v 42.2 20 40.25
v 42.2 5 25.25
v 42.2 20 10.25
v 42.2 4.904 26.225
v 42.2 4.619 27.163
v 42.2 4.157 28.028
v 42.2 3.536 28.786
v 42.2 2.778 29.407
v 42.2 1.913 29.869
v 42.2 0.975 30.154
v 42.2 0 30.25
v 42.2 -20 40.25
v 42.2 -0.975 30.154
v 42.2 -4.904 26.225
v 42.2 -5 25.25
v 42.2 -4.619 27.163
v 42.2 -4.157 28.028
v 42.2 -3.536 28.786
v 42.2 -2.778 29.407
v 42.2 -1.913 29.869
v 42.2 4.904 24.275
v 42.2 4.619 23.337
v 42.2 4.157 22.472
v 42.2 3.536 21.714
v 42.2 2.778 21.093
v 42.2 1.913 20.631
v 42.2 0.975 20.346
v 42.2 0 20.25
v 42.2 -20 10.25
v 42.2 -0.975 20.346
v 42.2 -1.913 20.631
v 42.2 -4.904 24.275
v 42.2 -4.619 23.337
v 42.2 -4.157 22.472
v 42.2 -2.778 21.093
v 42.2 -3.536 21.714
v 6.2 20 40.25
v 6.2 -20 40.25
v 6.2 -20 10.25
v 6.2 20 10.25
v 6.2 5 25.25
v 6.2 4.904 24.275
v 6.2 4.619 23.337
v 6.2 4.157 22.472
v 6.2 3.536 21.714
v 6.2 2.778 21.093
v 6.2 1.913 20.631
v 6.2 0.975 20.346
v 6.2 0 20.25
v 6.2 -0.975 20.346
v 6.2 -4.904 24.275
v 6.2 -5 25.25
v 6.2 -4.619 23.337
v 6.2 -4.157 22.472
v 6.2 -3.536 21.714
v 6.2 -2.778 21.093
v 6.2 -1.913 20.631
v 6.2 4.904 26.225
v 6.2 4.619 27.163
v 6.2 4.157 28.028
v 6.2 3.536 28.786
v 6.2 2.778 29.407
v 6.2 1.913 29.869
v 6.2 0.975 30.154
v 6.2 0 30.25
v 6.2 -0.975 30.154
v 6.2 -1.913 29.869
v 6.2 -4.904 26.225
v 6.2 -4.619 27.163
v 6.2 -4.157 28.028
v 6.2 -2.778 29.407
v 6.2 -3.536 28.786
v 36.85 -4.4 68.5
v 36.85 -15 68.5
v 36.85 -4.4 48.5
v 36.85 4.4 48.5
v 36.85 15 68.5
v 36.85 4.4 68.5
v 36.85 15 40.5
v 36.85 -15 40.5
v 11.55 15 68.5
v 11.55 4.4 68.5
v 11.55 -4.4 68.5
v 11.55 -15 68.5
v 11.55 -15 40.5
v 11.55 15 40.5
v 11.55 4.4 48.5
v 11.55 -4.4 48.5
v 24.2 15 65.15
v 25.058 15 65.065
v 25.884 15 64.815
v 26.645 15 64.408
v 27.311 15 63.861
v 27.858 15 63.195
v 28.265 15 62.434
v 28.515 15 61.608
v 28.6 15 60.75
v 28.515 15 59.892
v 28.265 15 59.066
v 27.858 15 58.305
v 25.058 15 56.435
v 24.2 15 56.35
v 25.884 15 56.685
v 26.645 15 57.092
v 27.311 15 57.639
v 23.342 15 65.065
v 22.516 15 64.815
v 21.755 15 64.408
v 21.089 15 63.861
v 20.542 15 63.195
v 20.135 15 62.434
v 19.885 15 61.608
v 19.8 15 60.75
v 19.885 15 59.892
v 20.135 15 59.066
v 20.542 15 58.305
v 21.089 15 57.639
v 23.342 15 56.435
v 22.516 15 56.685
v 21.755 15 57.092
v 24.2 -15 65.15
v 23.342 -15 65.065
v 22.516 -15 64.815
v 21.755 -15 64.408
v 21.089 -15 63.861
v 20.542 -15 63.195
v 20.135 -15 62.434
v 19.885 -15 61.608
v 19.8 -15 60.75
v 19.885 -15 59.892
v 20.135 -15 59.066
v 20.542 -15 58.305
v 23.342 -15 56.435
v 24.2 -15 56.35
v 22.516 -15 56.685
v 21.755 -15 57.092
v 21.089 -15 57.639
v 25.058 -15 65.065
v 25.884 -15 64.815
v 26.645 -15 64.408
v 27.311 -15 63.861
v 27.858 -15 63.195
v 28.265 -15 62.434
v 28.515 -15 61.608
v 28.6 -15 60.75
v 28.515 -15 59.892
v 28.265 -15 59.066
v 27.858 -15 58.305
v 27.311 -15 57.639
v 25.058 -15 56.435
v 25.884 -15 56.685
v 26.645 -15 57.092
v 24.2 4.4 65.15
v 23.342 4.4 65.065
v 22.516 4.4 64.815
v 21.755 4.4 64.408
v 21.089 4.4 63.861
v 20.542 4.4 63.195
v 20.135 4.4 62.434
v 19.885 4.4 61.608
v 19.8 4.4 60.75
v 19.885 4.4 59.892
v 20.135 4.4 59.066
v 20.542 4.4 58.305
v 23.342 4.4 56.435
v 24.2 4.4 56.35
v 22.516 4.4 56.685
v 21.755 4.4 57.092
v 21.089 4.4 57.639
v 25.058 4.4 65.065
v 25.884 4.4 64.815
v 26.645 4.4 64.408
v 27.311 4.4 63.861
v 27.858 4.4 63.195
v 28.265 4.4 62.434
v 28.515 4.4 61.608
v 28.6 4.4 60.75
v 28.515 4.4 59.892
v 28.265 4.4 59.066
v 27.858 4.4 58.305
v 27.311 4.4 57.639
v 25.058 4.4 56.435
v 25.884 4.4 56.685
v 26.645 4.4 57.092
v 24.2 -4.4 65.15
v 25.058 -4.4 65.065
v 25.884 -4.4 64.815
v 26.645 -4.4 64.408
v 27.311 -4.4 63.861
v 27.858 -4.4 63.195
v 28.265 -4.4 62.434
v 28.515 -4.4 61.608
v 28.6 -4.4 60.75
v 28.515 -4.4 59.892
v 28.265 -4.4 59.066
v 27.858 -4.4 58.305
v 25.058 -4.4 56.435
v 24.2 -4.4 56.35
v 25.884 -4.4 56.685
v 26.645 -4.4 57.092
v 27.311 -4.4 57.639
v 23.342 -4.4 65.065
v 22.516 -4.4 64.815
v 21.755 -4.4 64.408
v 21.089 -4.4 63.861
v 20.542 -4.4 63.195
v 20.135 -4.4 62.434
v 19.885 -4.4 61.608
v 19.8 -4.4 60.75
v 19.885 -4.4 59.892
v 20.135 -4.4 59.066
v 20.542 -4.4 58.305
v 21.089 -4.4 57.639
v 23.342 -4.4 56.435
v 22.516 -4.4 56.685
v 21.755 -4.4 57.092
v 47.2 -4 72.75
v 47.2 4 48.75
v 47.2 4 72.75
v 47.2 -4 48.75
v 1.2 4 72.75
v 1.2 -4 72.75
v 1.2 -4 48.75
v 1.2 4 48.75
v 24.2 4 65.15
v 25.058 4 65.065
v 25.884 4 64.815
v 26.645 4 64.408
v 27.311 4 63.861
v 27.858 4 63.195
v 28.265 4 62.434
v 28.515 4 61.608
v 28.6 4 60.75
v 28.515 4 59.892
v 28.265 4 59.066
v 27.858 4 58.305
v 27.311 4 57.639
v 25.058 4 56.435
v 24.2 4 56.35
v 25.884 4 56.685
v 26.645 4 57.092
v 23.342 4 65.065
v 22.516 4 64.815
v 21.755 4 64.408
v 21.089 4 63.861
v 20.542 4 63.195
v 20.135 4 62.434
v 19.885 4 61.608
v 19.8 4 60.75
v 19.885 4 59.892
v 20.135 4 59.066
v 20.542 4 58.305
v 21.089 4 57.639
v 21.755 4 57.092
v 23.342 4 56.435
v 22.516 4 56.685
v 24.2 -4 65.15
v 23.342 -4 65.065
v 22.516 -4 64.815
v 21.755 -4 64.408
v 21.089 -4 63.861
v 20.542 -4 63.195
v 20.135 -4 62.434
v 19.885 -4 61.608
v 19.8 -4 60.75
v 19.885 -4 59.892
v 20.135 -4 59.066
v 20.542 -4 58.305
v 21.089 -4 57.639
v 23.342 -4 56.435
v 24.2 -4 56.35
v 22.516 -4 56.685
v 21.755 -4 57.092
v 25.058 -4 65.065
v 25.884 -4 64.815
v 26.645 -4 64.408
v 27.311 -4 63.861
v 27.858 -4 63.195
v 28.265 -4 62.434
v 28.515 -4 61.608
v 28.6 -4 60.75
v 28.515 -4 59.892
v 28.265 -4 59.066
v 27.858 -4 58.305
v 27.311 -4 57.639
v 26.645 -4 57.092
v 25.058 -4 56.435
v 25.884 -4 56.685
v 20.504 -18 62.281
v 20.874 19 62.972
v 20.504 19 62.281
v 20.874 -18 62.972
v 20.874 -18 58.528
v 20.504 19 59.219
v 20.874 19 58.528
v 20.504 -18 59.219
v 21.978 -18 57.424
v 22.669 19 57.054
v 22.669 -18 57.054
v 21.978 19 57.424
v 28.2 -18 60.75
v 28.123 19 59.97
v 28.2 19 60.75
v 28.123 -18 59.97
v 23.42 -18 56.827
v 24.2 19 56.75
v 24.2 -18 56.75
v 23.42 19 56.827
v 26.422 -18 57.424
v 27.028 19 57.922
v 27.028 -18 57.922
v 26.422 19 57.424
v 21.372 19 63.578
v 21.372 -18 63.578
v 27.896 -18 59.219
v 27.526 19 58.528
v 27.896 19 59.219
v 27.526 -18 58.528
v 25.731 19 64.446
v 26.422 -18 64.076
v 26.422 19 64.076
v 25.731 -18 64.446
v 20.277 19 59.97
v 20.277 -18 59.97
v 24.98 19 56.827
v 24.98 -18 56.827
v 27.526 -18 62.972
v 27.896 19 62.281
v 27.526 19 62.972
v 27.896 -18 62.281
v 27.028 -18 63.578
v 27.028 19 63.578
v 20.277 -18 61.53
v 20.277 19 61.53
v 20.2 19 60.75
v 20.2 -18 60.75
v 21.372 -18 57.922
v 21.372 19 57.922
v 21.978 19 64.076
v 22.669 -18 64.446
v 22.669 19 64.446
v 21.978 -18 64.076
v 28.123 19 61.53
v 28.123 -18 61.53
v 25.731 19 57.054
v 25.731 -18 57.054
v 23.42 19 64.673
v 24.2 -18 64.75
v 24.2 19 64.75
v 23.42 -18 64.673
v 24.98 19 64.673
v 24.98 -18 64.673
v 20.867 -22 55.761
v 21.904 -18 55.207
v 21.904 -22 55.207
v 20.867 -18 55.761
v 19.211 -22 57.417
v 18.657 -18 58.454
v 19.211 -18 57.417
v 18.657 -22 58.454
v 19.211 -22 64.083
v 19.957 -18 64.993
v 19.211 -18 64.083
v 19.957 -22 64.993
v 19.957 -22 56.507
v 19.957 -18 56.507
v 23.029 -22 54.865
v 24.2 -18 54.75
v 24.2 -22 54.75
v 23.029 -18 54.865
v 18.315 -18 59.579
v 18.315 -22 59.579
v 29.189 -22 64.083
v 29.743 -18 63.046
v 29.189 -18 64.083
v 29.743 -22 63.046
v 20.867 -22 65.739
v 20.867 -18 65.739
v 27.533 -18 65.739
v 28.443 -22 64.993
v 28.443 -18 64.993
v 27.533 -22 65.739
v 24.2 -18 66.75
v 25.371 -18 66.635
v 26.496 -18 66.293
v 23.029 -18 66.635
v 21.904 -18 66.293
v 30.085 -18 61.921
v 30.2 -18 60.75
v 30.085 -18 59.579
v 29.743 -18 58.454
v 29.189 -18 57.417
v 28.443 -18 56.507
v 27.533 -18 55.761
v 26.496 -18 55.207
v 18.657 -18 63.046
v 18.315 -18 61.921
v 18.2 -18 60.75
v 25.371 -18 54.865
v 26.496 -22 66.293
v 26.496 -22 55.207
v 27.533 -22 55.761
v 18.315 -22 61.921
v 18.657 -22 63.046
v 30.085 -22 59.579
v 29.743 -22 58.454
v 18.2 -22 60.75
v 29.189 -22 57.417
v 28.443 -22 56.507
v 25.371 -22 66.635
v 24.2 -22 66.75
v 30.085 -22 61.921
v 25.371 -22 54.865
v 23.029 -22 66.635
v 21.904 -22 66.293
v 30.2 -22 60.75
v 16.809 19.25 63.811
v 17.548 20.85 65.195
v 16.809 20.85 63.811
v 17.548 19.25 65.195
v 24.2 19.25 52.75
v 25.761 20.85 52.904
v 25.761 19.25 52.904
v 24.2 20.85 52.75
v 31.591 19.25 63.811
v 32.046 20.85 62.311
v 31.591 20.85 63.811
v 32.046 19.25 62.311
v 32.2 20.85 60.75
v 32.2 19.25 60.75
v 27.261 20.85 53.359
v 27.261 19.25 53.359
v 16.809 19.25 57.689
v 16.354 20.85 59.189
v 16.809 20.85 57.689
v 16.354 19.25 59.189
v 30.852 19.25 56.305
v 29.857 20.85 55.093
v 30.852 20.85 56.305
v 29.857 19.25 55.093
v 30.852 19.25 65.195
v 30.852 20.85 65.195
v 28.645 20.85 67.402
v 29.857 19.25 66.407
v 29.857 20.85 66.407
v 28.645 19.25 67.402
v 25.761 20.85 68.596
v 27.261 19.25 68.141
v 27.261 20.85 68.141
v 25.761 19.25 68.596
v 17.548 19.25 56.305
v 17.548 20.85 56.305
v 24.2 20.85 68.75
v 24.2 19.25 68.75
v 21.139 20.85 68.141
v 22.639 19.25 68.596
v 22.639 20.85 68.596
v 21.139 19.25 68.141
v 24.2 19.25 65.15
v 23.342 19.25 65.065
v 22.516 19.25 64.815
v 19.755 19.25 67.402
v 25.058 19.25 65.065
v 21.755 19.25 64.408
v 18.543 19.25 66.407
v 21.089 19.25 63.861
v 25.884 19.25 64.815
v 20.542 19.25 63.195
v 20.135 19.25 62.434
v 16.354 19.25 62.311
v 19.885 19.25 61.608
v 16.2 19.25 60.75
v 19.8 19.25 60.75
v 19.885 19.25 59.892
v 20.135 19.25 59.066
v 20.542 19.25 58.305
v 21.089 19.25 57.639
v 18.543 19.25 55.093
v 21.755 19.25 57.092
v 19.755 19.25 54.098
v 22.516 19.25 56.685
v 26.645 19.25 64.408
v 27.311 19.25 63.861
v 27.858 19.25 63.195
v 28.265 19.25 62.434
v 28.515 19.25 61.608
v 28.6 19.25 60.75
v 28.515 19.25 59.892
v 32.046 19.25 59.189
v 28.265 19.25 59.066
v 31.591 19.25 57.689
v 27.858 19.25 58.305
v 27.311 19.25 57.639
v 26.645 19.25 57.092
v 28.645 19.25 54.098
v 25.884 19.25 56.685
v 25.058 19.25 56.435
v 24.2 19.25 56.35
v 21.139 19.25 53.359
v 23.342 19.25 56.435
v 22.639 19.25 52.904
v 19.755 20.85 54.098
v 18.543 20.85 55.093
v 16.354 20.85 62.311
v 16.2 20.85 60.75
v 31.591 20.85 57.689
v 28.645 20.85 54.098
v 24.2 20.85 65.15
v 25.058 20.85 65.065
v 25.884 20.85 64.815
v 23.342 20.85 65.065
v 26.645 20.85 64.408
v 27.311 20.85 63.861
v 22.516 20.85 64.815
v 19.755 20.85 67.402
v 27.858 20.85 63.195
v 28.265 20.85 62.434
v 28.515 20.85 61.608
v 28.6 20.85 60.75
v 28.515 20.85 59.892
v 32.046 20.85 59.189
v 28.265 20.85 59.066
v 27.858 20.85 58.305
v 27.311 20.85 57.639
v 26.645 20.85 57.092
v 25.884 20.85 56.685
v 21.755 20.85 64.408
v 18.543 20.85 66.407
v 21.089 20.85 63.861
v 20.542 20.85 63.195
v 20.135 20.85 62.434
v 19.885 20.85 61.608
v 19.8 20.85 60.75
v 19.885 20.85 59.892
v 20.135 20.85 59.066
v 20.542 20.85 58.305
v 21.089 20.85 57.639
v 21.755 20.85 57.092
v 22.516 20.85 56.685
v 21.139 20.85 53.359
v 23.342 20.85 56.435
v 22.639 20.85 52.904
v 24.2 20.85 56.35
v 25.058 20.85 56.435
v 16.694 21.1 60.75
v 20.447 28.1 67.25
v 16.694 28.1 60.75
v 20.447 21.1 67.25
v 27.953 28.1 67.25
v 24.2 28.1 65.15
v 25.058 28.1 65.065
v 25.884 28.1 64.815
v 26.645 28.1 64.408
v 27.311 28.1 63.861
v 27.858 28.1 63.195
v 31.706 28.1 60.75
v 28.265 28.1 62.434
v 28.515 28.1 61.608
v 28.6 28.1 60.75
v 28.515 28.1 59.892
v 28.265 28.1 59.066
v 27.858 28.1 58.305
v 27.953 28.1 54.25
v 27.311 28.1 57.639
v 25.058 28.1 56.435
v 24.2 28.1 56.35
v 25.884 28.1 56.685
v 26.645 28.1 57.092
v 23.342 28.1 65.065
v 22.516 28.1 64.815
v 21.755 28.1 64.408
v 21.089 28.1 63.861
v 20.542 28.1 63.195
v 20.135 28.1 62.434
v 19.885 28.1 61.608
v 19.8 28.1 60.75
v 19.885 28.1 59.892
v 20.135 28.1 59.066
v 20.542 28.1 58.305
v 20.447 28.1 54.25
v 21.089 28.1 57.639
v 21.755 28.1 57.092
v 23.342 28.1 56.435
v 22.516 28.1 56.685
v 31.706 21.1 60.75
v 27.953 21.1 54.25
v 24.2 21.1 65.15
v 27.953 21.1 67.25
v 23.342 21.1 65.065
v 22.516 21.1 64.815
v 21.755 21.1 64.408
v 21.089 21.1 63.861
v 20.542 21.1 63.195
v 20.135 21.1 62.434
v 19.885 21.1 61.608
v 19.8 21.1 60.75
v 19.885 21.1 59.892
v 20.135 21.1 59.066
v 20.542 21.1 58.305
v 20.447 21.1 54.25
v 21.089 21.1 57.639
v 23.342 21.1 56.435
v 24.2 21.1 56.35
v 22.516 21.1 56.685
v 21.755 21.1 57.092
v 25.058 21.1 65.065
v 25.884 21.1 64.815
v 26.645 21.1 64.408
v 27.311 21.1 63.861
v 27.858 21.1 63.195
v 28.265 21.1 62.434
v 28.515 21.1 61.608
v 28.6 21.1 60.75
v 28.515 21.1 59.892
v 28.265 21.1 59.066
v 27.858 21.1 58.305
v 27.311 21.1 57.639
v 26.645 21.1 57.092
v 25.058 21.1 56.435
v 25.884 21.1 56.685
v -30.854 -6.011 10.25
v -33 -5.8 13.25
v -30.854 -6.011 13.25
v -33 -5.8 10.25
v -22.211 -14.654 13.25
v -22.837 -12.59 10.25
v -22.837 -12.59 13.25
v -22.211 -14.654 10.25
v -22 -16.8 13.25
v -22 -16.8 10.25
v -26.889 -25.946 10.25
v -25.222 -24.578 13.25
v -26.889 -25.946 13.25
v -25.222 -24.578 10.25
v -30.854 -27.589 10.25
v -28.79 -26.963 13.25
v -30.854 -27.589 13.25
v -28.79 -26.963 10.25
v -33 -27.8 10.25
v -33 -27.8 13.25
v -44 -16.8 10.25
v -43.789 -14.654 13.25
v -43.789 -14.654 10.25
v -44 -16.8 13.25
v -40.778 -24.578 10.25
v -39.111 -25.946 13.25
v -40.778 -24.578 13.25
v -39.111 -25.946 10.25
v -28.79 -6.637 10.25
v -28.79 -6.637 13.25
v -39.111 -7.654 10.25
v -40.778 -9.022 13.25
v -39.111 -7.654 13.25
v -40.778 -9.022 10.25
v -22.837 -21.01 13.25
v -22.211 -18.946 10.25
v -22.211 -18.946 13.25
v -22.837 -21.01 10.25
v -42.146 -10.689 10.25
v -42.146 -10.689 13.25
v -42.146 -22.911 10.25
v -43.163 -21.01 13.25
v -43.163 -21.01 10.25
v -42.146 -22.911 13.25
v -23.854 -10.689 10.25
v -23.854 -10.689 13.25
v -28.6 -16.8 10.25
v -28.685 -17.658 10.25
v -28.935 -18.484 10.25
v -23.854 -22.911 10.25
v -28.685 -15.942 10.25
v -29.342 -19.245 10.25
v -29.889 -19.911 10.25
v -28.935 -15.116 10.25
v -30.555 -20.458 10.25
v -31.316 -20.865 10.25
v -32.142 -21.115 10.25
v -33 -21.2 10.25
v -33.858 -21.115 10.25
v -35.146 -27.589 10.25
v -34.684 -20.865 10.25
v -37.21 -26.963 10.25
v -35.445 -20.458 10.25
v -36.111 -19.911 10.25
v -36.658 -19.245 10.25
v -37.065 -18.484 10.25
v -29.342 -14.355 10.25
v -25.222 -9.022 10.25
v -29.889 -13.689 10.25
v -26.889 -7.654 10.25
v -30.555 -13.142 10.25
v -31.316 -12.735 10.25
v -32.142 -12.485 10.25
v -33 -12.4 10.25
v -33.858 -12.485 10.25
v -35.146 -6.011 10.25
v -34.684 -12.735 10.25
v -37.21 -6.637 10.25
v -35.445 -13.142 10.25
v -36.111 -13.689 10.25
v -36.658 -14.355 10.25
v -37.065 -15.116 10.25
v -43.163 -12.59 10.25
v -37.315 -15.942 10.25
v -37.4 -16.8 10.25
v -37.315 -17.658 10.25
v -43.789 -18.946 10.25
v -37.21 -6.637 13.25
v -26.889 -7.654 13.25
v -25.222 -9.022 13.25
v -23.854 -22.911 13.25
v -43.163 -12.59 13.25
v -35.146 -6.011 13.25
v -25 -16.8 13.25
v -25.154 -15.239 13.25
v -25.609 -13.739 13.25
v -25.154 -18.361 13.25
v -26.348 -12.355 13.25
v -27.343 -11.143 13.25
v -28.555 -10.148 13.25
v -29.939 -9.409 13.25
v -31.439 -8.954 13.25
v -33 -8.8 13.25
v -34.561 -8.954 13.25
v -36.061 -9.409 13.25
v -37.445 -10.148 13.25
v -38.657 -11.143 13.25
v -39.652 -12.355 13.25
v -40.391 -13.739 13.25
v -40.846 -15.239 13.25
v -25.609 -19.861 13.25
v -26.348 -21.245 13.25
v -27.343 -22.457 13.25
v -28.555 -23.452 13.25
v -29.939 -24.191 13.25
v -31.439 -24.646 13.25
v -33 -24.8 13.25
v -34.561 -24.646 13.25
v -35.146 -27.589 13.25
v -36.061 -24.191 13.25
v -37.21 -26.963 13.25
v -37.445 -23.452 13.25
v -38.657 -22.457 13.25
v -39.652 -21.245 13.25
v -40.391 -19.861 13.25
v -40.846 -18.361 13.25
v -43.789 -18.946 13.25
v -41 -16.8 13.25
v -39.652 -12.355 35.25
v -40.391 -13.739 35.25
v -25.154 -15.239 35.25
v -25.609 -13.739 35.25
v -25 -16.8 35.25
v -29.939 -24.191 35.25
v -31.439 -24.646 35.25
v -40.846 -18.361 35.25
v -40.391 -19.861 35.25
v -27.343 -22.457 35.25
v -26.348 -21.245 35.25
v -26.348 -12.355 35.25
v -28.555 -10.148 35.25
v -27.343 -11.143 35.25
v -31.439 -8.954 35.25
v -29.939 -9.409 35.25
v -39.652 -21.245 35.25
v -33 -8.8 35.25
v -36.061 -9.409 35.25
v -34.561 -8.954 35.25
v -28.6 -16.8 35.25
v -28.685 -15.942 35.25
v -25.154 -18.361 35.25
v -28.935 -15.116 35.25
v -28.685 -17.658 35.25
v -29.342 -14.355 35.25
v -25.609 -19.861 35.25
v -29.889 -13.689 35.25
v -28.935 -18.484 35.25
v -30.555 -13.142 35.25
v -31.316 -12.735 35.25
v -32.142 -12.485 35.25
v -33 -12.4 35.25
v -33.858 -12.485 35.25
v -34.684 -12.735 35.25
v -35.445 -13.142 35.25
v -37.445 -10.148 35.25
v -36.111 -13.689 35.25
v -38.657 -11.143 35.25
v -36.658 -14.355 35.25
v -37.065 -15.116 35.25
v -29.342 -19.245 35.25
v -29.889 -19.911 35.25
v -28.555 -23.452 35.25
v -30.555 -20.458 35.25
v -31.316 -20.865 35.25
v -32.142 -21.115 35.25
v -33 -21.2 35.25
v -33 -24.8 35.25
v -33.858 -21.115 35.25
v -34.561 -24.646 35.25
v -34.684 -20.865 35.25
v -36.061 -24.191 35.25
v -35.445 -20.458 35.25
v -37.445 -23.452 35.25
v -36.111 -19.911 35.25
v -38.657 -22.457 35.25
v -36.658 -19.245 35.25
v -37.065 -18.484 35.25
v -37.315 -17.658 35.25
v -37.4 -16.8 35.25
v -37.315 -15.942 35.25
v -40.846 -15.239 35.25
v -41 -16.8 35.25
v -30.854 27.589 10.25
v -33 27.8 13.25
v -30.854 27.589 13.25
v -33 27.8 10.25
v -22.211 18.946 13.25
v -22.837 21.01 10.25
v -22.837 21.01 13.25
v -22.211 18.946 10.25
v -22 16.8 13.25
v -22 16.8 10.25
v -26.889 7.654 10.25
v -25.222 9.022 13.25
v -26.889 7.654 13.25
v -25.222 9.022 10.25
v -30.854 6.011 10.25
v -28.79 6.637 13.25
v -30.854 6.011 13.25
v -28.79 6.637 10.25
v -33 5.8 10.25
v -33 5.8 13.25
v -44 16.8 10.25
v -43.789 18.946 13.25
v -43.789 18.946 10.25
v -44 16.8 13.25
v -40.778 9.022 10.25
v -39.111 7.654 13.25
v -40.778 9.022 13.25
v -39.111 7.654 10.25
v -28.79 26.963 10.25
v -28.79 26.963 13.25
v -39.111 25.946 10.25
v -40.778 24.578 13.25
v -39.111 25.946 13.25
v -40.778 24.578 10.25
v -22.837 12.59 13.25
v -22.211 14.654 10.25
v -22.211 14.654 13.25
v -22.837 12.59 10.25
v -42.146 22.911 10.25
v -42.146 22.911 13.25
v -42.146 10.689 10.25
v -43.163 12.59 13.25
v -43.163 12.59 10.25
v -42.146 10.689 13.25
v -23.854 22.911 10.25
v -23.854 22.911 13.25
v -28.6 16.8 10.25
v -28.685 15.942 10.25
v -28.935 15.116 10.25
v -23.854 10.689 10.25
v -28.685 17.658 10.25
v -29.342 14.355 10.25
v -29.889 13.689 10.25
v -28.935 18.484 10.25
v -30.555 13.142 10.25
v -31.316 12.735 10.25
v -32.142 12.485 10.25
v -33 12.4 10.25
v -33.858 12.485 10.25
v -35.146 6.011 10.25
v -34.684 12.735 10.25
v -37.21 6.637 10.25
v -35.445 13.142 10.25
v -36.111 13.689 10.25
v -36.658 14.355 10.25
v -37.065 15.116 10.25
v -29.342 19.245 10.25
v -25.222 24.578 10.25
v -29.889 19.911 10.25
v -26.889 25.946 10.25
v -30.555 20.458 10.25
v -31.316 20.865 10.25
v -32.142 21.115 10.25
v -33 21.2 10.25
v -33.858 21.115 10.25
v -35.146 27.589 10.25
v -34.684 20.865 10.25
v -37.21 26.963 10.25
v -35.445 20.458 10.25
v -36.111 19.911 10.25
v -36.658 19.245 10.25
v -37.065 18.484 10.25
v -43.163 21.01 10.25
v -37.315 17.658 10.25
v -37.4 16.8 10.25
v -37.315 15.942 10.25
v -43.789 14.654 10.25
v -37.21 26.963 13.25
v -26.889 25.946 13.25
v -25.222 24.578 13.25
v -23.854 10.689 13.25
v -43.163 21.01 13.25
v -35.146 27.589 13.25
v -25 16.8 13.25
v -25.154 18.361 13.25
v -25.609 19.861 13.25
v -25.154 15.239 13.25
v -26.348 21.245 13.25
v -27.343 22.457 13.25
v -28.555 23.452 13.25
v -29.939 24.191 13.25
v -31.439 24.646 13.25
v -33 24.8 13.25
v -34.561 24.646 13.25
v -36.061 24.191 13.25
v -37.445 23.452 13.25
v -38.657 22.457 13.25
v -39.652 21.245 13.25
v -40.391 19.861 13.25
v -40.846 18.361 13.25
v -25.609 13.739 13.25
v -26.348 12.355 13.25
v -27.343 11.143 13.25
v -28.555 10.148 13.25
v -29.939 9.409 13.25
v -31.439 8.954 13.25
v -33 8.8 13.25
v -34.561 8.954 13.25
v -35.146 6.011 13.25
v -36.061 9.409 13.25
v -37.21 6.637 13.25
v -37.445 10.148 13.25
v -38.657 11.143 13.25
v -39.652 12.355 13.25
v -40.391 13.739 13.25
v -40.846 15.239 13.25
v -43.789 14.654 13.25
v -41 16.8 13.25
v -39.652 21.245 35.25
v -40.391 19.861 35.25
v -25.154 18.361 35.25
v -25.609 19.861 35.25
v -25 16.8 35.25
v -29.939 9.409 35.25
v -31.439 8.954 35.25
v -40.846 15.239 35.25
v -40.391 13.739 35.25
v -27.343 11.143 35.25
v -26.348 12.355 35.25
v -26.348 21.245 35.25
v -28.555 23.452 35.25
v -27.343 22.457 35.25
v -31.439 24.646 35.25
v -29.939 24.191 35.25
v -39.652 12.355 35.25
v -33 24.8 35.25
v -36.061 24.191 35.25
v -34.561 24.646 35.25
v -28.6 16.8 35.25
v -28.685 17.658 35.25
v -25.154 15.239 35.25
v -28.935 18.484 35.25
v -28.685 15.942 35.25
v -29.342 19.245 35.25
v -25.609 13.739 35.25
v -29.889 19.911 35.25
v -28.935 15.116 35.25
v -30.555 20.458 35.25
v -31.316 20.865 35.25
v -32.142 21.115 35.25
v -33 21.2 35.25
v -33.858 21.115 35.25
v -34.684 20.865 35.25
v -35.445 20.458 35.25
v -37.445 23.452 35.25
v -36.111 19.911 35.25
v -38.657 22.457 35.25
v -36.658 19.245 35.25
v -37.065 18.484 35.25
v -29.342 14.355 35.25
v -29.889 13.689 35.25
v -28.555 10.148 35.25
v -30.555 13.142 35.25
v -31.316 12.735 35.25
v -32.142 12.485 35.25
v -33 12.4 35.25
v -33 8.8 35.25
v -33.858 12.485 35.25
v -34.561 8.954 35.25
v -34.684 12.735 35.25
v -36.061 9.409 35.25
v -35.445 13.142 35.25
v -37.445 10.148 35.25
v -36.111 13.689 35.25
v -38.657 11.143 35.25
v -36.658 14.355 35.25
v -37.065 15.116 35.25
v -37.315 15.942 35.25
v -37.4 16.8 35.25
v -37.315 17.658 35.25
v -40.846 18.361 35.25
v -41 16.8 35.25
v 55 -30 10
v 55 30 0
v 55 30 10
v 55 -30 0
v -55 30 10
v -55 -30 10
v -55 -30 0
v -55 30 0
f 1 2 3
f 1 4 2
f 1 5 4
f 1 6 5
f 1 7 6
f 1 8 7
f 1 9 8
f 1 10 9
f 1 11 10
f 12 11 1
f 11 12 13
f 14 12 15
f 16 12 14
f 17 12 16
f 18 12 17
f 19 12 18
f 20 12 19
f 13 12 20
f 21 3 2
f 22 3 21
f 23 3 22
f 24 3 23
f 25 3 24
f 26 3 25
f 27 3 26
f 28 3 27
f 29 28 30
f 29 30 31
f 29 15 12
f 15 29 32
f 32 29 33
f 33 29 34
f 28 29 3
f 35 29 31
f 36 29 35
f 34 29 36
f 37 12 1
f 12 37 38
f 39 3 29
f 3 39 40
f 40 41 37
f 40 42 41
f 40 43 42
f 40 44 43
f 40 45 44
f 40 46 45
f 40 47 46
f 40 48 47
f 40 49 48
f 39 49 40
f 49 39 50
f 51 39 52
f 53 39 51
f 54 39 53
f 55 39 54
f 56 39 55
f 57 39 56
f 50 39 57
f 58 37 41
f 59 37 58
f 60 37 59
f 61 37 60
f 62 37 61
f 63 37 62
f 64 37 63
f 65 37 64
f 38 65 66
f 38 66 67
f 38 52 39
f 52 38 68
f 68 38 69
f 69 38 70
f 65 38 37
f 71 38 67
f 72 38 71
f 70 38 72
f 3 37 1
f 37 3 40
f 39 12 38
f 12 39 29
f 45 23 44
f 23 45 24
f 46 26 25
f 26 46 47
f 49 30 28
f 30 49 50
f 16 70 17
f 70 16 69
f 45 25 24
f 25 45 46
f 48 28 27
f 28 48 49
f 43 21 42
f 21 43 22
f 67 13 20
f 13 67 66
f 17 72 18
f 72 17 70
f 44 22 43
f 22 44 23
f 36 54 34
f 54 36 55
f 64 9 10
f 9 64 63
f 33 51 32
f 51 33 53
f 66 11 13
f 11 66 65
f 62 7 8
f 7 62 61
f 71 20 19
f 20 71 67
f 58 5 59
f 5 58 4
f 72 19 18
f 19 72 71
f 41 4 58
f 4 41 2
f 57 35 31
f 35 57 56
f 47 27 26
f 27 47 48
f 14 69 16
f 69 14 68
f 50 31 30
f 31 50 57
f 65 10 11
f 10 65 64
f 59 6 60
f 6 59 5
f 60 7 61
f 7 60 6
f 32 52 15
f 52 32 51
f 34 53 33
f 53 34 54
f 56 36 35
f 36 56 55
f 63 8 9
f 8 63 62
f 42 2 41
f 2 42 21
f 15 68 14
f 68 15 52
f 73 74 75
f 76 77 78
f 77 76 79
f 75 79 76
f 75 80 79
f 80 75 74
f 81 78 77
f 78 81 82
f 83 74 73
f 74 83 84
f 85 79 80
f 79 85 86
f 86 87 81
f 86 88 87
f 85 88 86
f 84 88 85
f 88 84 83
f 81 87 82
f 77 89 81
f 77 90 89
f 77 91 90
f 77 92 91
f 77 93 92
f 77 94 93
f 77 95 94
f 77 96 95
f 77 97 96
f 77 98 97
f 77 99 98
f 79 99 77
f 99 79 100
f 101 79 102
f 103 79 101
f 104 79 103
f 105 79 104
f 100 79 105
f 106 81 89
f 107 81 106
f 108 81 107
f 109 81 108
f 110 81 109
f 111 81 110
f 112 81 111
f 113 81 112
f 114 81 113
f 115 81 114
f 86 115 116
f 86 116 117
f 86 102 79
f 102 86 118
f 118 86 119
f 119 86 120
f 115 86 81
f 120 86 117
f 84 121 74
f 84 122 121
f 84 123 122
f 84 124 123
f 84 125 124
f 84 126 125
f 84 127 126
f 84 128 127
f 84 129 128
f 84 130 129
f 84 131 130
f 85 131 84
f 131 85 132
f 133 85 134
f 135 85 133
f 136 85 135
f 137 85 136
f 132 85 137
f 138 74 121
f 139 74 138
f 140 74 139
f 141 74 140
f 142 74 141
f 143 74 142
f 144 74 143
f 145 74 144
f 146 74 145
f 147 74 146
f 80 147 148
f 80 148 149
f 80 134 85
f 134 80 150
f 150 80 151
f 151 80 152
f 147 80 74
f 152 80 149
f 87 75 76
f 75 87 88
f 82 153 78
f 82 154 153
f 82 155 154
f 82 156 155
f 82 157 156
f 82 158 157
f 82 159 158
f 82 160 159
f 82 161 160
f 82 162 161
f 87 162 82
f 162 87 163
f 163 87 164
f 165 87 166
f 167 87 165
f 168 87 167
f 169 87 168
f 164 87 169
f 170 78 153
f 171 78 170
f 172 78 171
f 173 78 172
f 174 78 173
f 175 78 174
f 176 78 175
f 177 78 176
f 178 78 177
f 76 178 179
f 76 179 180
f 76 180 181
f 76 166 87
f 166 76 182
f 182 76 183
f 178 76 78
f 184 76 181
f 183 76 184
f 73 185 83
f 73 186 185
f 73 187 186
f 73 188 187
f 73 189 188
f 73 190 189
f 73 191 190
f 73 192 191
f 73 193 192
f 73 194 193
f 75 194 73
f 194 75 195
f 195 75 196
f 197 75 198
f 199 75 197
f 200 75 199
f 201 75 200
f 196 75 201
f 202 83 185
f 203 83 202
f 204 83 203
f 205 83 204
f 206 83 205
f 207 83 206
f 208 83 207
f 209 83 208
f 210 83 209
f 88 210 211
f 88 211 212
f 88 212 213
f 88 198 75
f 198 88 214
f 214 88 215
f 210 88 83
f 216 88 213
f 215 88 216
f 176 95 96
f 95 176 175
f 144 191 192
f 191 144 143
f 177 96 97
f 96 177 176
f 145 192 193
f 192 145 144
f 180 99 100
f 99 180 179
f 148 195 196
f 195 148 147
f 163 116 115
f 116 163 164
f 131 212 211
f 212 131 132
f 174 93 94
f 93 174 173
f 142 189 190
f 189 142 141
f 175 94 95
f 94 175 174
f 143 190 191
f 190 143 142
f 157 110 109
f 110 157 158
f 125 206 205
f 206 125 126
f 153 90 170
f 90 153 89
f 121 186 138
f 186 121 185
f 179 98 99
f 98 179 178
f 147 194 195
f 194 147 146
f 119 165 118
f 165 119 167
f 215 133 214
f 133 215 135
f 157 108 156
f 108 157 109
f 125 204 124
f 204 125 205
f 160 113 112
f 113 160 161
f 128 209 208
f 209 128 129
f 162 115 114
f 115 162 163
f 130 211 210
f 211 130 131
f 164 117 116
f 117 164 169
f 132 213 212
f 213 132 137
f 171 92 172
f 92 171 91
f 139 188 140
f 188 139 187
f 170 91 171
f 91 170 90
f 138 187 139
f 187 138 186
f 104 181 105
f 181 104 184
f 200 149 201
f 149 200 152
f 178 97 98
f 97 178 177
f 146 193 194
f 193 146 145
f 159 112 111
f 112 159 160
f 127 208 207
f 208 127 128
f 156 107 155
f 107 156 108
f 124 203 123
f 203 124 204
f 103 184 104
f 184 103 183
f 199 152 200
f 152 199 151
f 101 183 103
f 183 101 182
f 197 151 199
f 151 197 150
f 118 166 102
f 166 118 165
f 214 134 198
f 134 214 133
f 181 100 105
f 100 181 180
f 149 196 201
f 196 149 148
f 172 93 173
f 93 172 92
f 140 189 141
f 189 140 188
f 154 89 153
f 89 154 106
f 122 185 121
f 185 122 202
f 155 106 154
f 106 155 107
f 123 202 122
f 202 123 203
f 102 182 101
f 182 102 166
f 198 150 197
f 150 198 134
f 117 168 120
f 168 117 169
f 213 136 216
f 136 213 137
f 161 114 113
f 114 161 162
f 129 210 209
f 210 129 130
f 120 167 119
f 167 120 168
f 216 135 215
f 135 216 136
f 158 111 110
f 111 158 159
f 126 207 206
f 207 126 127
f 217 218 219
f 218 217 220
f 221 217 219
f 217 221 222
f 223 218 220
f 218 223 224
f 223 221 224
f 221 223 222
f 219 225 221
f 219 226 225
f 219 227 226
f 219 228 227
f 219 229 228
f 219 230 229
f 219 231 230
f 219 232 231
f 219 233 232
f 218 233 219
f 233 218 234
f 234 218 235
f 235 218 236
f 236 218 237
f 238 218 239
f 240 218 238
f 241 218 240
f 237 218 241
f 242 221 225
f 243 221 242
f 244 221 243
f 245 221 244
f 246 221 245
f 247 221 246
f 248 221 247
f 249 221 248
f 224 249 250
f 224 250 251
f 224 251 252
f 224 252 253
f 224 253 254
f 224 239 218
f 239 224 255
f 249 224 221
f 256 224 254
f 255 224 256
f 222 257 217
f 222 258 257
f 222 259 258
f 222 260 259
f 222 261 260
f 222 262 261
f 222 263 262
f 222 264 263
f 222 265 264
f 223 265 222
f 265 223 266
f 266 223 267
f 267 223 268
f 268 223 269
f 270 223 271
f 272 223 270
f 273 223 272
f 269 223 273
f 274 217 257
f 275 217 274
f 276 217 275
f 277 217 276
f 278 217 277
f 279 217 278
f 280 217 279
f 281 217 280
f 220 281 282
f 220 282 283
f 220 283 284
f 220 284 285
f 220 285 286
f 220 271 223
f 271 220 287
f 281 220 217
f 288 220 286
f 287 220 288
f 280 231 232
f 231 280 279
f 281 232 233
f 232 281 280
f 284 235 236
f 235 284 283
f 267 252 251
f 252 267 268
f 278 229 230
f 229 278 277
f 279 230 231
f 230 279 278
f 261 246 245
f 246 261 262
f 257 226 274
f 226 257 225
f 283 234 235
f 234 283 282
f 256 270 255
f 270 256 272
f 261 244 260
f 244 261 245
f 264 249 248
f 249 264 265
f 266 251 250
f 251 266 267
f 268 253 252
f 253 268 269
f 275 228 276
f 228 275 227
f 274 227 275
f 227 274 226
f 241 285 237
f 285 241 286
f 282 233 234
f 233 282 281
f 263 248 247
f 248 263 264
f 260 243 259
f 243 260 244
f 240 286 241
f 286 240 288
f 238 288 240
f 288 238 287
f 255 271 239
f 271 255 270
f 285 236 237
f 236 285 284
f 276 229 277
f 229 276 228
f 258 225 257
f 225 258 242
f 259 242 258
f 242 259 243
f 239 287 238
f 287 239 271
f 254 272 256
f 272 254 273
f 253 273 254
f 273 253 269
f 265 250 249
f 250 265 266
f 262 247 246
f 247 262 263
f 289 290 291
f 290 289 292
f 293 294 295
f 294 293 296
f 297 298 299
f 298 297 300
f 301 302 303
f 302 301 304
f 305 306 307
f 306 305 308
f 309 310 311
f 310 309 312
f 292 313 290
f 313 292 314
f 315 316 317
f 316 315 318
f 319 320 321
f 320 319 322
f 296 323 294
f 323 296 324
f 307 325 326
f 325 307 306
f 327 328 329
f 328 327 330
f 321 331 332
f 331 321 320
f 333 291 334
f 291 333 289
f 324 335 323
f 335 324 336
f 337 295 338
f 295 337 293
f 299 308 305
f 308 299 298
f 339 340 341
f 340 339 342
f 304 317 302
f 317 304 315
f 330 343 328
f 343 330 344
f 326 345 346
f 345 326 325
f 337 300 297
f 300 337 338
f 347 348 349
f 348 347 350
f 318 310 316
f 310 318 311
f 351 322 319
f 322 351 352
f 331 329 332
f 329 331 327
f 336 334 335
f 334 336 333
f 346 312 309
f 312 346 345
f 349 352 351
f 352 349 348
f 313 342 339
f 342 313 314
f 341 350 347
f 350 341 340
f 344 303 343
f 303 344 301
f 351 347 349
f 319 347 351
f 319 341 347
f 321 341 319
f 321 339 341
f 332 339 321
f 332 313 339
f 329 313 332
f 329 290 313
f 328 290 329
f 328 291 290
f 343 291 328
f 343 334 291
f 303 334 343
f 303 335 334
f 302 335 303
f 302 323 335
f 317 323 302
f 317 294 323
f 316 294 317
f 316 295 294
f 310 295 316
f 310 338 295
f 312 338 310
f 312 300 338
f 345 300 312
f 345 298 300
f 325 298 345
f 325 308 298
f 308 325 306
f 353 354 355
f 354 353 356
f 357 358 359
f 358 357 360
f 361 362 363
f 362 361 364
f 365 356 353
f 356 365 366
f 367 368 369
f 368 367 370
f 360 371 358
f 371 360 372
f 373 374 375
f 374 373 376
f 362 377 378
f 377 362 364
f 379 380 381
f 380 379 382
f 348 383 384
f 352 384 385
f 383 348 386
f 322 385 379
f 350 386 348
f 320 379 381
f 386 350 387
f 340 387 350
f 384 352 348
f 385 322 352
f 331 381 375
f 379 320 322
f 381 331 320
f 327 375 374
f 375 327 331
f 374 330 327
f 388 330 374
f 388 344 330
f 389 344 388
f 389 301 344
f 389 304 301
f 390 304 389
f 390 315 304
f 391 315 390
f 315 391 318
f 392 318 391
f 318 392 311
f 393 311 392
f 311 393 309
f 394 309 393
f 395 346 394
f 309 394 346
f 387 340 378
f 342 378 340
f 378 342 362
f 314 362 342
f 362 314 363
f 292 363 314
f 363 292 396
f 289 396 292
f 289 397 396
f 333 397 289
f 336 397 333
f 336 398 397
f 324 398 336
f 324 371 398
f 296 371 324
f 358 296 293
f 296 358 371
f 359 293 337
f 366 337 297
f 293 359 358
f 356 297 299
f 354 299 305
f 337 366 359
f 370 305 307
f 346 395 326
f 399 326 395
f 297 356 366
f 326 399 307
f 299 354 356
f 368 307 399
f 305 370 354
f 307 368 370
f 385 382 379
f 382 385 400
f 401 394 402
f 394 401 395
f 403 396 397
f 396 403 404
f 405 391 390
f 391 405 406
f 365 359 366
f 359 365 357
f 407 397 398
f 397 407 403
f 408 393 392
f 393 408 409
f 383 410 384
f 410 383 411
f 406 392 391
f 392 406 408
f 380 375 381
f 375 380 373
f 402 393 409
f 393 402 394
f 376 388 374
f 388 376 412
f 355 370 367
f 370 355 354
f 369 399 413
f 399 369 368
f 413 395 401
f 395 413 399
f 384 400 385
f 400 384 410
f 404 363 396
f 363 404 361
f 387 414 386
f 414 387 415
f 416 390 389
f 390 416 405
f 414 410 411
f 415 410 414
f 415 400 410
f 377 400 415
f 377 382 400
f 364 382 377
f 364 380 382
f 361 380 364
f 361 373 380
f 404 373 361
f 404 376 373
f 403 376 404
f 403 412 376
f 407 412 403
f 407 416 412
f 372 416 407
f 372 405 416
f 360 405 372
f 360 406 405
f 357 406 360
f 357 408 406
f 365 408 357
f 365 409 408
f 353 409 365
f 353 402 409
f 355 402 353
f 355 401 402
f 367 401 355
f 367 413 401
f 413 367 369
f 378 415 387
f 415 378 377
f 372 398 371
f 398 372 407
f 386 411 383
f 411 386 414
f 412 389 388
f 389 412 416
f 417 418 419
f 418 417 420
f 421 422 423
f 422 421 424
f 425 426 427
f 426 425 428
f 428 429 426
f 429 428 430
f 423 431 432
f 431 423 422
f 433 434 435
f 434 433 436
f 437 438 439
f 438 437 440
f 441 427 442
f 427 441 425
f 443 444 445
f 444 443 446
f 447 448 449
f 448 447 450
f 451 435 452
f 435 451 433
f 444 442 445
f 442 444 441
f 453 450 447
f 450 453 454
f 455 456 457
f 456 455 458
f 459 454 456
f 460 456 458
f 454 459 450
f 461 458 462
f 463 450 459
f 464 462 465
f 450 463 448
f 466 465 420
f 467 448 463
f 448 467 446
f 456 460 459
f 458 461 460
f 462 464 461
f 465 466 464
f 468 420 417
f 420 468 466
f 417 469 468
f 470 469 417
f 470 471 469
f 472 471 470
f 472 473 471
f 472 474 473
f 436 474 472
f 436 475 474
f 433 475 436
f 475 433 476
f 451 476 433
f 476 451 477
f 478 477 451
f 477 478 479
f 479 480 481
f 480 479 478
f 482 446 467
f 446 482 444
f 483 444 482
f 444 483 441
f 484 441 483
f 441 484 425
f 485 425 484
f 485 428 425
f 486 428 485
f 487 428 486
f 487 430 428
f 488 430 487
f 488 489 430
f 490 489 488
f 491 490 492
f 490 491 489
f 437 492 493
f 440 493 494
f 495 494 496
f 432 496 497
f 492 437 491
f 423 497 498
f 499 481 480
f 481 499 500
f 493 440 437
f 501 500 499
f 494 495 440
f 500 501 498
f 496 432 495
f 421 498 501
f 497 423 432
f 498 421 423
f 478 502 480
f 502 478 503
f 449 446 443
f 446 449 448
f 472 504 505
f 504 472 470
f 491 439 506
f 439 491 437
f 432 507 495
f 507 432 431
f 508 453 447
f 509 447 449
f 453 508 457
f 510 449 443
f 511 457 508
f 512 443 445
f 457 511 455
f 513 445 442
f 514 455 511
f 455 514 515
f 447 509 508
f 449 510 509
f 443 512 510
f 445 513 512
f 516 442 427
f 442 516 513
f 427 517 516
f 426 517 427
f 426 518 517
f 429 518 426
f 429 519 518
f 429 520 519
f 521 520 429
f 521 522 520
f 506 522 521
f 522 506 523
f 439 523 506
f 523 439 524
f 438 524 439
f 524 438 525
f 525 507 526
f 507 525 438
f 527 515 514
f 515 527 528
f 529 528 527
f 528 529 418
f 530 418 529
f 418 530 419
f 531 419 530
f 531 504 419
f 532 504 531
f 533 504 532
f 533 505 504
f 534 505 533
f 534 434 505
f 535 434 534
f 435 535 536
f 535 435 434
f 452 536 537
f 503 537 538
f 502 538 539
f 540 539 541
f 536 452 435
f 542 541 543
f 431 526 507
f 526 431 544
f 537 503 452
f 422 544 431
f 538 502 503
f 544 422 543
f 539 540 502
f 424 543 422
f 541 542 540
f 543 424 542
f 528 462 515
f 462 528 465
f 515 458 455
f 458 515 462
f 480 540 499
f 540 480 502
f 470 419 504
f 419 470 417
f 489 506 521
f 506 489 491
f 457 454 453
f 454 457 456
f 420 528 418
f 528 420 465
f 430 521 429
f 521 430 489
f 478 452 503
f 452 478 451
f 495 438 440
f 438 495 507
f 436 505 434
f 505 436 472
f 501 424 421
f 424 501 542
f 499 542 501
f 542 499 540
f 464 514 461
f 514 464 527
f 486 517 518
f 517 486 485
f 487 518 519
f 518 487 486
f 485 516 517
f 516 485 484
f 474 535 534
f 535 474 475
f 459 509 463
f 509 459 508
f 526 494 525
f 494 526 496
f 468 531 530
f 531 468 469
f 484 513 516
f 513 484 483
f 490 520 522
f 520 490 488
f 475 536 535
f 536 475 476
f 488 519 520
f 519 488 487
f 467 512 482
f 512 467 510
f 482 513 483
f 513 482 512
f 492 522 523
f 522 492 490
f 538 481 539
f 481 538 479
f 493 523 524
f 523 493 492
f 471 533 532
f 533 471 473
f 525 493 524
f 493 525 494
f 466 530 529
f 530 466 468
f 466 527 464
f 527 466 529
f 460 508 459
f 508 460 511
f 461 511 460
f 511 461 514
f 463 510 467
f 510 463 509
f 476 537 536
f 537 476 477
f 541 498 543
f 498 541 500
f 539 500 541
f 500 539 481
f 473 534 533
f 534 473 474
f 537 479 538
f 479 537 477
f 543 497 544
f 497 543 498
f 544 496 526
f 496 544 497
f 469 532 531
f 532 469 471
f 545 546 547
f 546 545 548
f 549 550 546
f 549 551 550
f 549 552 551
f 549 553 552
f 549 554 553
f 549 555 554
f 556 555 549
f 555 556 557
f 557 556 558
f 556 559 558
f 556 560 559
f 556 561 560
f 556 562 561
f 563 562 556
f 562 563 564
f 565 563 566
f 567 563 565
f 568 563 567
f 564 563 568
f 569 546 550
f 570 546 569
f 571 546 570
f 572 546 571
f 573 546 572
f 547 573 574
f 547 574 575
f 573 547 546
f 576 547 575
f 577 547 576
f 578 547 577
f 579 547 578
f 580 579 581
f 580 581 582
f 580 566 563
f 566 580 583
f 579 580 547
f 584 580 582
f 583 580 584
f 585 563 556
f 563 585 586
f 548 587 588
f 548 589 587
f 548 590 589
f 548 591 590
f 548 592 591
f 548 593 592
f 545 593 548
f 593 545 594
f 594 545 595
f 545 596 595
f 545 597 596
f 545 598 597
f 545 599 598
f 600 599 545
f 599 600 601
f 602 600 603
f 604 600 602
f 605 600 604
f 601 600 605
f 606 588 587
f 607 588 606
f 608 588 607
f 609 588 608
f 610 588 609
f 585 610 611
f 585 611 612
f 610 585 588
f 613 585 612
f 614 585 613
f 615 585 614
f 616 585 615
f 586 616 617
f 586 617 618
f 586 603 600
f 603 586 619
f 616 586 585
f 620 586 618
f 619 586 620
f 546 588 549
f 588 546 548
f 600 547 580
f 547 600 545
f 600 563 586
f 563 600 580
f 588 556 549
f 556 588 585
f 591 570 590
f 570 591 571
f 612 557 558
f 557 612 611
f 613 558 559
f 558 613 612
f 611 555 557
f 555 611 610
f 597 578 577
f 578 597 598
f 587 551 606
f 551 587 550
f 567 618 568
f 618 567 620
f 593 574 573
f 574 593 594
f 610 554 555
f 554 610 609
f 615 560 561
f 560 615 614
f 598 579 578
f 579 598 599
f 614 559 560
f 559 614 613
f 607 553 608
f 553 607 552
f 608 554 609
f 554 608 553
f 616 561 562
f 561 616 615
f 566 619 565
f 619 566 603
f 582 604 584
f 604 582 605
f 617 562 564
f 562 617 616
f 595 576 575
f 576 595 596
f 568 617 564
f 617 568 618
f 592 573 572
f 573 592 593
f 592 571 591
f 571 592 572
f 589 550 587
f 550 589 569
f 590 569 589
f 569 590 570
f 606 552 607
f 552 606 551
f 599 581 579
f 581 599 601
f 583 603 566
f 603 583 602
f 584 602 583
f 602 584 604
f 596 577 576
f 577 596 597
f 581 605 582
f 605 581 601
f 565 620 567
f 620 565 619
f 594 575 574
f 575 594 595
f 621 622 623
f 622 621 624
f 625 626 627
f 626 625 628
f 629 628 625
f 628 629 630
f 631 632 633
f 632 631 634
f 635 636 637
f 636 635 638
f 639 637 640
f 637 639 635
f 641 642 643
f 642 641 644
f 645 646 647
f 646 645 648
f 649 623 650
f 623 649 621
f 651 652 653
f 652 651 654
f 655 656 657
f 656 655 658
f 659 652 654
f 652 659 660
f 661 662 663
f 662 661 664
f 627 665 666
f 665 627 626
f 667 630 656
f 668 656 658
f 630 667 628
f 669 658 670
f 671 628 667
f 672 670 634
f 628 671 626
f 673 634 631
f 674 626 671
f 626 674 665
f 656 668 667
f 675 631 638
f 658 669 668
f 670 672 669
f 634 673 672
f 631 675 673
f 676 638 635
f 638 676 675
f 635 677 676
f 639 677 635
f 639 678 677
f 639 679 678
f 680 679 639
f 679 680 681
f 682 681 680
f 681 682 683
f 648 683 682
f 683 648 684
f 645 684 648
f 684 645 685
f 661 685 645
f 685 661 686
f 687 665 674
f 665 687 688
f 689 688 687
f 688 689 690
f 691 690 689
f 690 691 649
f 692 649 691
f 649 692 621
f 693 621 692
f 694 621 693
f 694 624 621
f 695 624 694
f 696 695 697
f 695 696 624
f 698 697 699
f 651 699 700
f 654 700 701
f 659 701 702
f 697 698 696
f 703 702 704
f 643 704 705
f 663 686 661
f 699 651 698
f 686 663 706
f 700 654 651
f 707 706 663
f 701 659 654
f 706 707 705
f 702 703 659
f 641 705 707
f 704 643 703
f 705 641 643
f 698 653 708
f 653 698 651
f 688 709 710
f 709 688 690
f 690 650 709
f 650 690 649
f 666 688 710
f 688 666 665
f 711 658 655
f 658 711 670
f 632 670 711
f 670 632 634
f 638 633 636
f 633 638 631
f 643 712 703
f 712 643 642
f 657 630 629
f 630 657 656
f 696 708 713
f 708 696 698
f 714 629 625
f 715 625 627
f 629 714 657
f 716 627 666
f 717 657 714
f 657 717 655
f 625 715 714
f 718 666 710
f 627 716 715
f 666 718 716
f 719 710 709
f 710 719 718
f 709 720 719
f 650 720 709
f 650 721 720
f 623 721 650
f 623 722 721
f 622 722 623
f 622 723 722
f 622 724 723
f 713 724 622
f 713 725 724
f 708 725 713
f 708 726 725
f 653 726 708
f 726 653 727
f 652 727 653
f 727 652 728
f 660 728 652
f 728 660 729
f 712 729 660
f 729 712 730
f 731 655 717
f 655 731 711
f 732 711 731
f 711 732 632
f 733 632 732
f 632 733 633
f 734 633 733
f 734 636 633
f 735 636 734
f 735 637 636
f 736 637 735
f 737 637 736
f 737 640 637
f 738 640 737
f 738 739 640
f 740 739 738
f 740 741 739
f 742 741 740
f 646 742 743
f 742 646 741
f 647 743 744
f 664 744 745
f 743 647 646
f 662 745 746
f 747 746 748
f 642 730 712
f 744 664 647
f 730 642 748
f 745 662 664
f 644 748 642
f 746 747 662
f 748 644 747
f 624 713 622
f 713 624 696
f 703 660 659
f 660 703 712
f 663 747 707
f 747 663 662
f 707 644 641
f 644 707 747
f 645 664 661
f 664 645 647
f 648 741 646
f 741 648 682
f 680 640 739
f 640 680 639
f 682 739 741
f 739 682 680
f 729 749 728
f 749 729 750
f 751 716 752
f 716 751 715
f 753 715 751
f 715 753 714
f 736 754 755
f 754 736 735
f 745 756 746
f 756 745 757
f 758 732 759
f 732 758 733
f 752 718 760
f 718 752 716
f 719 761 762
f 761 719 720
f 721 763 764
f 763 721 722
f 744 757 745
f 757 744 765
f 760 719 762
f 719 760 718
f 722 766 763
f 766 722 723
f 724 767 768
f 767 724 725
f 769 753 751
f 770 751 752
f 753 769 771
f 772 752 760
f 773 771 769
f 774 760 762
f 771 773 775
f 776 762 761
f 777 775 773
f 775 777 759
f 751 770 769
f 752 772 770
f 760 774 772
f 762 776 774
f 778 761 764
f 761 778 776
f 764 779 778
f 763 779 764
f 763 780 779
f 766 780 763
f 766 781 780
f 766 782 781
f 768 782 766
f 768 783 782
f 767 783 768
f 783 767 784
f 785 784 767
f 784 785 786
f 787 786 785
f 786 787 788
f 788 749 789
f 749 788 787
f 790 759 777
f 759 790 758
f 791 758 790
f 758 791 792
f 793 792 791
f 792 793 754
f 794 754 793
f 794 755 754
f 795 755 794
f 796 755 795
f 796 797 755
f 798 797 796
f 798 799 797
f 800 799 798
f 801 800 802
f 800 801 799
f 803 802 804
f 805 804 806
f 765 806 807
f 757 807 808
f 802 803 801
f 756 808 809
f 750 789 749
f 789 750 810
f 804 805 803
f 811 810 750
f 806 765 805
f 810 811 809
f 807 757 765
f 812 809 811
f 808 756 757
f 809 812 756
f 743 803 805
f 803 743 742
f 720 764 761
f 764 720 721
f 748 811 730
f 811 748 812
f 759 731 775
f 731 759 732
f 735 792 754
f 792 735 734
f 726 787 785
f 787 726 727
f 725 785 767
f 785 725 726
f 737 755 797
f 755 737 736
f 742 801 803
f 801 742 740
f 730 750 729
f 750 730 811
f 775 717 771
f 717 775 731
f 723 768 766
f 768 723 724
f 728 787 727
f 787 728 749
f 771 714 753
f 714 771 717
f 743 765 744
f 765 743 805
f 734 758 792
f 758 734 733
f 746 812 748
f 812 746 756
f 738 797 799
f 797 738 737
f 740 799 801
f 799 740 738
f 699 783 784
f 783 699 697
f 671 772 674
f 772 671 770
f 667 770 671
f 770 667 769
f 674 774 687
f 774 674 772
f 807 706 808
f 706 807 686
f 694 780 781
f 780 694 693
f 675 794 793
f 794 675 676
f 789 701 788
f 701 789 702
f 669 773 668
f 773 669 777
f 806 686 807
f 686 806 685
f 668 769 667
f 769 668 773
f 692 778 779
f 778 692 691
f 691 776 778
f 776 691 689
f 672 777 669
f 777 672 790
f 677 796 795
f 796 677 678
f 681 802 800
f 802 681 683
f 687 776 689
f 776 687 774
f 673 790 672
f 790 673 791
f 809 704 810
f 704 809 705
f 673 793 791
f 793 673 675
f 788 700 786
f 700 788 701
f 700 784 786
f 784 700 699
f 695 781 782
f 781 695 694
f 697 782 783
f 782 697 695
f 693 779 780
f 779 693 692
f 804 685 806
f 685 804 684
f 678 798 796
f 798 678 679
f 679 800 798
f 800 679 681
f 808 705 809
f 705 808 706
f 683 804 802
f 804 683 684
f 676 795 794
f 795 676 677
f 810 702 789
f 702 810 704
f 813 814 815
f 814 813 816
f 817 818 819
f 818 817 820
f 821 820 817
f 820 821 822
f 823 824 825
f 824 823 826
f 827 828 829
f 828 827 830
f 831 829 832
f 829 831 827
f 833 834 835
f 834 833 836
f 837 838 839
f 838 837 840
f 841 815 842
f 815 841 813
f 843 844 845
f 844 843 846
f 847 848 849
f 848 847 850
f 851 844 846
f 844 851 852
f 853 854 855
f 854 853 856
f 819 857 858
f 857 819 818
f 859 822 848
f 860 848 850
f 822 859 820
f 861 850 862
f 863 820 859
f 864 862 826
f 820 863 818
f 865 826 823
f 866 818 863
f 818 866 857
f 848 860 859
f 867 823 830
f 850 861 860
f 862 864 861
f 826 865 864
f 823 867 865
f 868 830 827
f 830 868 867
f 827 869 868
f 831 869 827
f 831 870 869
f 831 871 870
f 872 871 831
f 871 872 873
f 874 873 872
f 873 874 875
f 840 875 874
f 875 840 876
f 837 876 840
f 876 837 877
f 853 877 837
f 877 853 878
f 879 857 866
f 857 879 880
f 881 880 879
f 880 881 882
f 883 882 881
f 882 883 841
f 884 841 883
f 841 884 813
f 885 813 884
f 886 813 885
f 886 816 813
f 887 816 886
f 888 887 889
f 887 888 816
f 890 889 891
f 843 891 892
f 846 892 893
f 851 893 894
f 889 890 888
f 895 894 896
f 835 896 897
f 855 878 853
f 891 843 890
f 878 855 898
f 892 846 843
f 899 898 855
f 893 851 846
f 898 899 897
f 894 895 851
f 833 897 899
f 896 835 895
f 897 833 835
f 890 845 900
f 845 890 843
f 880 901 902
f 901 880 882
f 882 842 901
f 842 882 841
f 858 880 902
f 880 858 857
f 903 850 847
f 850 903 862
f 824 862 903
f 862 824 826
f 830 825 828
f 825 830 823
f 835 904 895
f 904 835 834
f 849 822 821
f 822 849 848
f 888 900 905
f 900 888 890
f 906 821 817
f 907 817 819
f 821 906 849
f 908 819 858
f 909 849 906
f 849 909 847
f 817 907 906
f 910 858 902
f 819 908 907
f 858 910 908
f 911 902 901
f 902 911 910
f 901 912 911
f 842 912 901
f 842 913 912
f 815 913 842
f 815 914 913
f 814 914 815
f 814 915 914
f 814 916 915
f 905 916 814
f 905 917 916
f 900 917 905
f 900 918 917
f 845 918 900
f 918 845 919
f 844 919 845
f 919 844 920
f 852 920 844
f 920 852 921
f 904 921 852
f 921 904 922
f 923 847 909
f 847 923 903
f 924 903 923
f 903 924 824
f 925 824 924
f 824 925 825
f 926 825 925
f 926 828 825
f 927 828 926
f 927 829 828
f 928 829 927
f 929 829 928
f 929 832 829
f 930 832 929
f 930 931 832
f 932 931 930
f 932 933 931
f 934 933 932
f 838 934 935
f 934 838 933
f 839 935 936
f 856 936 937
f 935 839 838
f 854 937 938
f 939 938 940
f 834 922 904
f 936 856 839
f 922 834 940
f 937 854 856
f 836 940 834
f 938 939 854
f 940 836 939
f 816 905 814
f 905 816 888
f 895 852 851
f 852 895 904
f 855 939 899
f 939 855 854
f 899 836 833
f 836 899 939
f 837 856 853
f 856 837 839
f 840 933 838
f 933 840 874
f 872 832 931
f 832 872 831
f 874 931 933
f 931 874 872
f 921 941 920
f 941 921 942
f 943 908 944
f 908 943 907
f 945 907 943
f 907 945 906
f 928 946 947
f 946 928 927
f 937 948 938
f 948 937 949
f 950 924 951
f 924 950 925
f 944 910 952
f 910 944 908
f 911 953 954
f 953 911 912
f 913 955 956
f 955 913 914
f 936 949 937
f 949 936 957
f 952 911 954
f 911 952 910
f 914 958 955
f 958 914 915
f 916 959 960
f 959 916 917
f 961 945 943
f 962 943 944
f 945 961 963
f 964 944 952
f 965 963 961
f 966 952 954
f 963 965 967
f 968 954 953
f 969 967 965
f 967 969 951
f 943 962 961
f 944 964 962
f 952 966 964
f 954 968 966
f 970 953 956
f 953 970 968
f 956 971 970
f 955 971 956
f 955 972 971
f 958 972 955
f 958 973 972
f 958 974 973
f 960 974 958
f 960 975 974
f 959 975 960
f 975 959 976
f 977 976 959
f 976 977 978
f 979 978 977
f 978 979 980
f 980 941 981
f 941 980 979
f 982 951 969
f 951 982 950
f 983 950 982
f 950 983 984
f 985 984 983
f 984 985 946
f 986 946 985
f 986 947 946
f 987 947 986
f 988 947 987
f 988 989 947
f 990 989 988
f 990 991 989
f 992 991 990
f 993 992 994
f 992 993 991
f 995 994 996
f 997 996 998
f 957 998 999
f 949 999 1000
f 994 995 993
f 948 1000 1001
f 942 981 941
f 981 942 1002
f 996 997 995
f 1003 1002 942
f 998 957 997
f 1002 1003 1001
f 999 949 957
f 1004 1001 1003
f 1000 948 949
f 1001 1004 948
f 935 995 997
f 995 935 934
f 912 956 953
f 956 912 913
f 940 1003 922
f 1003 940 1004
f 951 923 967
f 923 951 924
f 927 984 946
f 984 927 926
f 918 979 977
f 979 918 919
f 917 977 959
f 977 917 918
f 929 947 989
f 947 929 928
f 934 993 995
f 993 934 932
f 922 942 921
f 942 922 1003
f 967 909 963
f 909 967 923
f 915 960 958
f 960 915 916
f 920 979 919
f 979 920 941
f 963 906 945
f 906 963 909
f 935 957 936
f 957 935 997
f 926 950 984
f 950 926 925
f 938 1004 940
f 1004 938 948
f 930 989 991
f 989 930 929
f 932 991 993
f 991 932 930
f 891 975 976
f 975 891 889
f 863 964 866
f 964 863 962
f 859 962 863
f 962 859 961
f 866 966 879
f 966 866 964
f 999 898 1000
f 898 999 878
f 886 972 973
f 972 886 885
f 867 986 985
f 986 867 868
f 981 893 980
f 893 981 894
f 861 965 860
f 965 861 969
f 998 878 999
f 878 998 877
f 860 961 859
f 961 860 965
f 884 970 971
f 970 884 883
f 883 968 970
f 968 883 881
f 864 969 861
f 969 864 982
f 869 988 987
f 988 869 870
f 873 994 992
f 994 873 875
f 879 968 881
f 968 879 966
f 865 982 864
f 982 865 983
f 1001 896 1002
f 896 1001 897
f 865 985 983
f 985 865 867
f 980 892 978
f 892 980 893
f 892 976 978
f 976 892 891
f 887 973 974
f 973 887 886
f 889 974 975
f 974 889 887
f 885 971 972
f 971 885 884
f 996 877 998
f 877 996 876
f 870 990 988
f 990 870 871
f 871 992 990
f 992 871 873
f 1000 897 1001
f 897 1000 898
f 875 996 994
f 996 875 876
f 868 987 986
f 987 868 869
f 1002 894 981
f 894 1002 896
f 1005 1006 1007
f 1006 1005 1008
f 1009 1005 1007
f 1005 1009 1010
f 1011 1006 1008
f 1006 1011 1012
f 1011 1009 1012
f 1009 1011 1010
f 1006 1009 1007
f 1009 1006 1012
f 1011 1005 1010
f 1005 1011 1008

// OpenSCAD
$fn = 32;

// ------------------------------------------------------------------------
// Indexing jig: plate 110 x 60 mm, pin d8
// Every part is its own module, assembly() places every instance.
// ------------------------------------------------------------------------

// --- part 1 ---
module jig_plate() {
  difference() {
    translate([-55, -30, 0]) cube([110, 60, 10]);
  }
}

// --- part 2 ---
module locator_block() {
  difference() {
    translate([-18, -20, 0]) cube([36, 40, 30]);
    translate([0, 0, 15]) rotate([0, 90, 0]) cylinder(h = 38, d = 10, center = true);
  }
}

// --- part 3 ---
module index_fork() {
  difference() {
    translate([-12.65, -15, 0]) cube([25.3, 30, 28]);
    translate([-13.65, -4.4, 8]) cube([27.3, 8.8, 21]);
    translate([0, 0, 20.25]) rotate([90, 0, 0]) cylinder(h = 32, d = 8.8, center = true);
  }
}

// --- part 4 ---
module index_arm() {
  difference() {
    translate([-23, -4, 0]) cube([46, 8, 24]);
    translate([0, 0, 12]) rotate([90, 0, 0]) cylinder(h = 10, d = 8.8, center = true);
  }
}

// --- part 5 ---
module index_pin() {
  rotate([0, 90, 0]) cylinder(h = 38, d = 8, center = true);
  translate([-22, 0, 0]) rotate([0, 90, 0]) cylinder(h = 4, d = 12);
}

// --- part 6 ---
module pin_washer() {
  difference() {
      translate([0, 0, 0]) cylinder(h = 1.6, d = 16);
      translate([0, 0, -1]) cylinder(h = 3.6, d = 8.8);
    }
}

// --- part 7 ---
module lock_nut() {
  difference() {
    linear_extrude(height = 7) polygon(points = [[7.506, 0], [3.753, 6.5], [-3.753, 6.5], [-7.506, 0], [-3.753, -6.5], [3.753, -6.5]]);
    translate([0, 0, -1]) cylinder(h = 9, d = 8.8);
  }
}

// --- part 8 ---
module guide_bush_a() {
  difference() {
    union() {
      cylinder(h = 3, d = 22);
      translate([0, 0, 3]) cylinder(h = 22, d = 16);
    }
    translate([0, 0, -1]) cylinder(h = 27, d = 8.8);
  }
}

// --- part 9 ---
module guide_bush_b() {
  difference() {
    union() {
      cylinder(h = 3, d = 22);
      translate([0, 0, 3]) cylinder(h = 22, d = 16);
    }
    translate([0, 0, -1]) cylinder(h = 27, d = 8.8);
  }
}

// --- assembly ---
module assembly() {
  color([0.80, 0.24, 0.20]) translate([0, 0, 0]) rotate([0, 0, 0]) jig_plate();
  color([0.20, 0.45, 0.75]) translate([24.2, 0, 10.25]) rotate([0, 0, 0]) locator_block();
  color([0.25, 0.62, 0.32]) translate([24.2, 0, 40.5]) rotate([0, 0, 0]) index_fork();
  color([0.92, 0.70, 0.18]) translate([24.2, 0, 48.75]) rotate([0, 0, 0]) index_arm();
  color([0.58, 0.35, 0.70]) translate([24.2, 0, 60.75]) rotate([0, 0, 90]) index_pin();
  color([0.16, 0.66, 0.66]) translate([24.2, 20.85, 60.75]) rotate([90, 0, 0]) pin_washer();
  color([0.85, 0.48, 0.18]) translate([24.2, 28.1, 60.75]) rotate([90, 0, 0]) lock_nut();
  color([0.55, 0.60, 0.65]) translate([-33, -16.8, 10.25]) rotate([0, 0, 0]) guide_bush_a();
  color([0.75, 0.30, 0.55]) translate([-33, 16.8, 10.25]) rotate([0, 0, 0]) guide_bush_b();
}

assembly();
